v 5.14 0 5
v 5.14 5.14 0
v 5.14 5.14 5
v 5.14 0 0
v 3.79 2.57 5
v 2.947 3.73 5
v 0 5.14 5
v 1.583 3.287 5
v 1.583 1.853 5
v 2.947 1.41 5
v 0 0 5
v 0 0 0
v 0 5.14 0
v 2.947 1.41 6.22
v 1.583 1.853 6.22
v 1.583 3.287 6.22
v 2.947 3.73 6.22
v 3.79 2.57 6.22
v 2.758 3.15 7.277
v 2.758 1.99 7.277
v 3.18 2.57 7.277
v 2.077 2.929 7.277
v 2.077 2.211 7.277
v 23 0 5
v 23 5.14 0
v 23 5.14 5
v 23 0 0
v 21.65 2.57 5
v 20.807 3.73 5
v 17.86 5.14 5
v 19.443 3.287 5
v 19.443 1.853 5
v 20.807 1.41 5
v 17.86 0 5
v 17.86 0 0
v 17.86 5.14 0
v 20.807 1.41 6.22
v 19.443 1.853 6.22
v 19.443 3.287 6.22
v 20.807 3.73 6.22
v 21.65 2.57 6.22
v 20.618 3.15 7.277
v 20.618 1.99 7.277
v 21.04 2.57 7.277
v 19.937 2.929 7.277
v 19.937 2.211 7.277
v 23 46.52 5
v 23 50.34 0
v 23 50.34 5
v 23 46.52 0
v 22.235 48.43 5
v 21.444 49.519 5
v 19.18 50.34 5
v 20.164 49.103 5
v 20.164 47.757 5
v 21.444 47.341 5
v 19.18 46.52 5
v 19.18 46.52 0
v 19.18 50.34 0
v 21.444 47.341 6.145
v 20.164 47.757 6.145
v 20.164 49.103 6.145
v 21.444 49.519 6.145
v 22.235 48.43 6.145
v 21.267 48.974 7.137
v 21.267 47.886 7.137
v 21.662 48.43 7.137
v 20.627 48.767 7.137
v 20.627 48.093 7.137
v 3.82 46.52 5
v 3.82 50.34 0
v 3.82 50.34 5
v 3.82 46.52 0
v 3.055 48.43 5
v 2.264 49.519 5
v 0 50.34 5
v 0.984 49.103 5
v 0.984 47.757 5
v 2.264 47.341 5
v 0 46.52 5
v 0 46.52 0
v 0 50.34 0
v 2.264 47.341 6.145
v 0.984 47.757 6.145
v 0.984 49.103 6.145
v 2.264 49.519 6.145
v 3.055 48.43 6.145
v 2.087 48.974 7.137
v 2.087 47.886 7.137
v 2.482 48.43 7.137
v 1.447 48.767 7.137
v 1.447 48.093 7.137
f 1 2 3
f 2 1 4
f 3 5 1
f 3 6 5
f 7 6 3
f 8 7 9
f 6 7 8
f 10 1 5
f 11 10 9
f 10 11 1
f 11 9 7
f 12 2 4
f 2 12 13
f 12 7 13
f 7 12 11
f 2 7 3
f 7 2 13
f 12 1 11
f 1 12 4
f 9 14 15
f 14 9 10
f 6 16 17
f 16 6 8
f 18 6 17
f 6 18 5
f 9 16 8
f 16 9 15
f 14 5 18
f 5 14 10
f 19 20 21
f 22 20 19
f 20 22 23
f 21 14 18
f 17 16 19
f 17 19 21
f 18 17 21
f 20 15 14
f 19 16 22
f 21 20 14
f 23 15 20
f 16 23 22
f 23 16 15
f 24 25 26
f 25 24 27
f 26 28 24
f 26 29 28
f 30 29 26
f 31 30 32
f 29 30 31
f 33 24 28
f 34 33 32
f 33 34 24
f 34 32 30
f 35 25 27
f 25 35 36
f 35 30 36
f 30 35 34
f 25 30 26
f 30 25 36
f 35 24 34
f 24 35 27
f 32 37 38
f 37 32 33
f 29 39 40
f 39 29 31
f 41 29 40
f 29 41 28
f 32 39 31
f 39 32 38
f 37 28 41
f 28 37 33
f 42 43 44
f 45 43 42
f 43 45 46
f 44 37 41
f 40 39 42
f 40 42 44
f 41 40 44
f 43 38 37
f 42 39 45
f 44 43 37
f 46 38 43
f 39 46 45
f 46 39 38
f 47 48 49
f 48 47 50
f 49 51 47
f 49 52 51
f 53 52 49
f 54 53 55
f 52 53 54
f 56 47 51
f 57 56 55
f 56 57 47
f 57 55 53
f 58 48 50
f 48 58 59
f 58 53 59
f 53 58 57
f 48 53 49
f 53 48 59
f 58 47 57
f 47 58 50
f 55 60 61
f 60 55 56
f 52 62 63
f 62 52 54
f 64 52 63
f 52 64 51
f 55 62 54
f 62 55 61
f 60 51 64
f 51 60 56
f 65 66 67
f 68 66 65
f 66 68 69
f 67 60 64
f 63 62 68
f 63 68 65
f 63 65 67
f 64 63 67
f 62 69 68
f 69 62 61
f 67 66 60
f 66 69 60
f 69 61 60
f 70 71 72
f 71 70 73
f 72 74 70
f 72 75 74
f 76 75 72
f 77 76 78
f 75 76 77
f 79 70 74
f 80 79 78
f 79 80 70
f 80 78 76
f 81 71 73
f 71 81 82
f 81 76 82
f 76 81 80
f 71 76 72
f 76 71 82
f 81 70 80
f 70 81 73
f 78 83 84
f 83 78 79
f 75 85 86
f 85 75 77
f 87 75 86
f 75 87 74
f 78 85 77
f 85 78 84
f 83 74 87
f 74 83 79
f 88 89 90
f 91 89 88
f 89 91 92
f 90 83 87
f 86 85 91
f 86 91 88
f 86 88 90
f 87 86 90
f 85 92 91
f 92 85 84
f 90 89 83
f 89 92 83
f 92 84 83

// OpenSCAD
// Basic stand-off peg.  Defaults for a feather.
module peg(h1=5, r1=1.22, r2=2.57) {
  h2=r1*2;
  translate([-r2,-r2,0]) cube([r2*2, r2*2, h1]);
  cylinder(r=r1,h=h1+h2/2);
  translate([0, 0, h1+h2/2]) sphere(r=r1);
}

// Place pegs
module manyPegs(locations=[], sizes) {
  // If sizes is undef, then make array of default sizes same length as locations.
  sizes = sizes==undef ? [for(i=locations) [5, 1.22, 2.57] ] : sizes;

  for( idx = [0 : len(locations)-1]) {
    translate(locations[idx]) {
      h=sizes[idx][0];
      r1=sizes[idx][1];
      r2=sizes[idx][2];
      peg(h1=h, r1=r1, r2=r2);
    }
  }
}

// Layouts for boards I use:

function featherTriWing_locations(edgeToPegCenter=2.57) =  [
  [edgeToPegCenter, edgeToPegCenter, 0],
  [71-edgeToPegCenter, edgeToPegCenter, 0],
  [71-edgeToPegCenter, 51-edgeToPegCenter, 0],
  [edgeToPegCenter, 51-edgeToPegCenter, 0],
];
function featherTriWing_sizes(h=5, edgeToPegCenter=2.57) =  [
  for (i=[0:3]) [h, 1.22, edgeToPegCenter]
];

// Huzzah ESP8266 has two differnet peg sizes and locations.
// two are 1.91mm from edgeToCenter.
function featherHuzzahESP8266_locations() = [
  [2.57, 2.57, 0],
  [23-2.57, 2.57, 0],
  [23-1.91, 51-2.57, 0],
  [1.91, 51-2.57, 0],
];
// two are 2.29mm wide.(r=1.145)
function featherHuzzahESP8266_sizes(h=5) = [
  [h, 1.22, 2.57],
  [h, 1.22, 2.57],
  [h, 1.145, 1.91],
  [h, 1.145, 1.91],
];

// ======================================================================
// manyPegs(locations=featherTriWing_locations());
manyPegs(locations=featherHuzzahESP8266_locations(), sizes=featherHuzzahESP8266_sizes());
